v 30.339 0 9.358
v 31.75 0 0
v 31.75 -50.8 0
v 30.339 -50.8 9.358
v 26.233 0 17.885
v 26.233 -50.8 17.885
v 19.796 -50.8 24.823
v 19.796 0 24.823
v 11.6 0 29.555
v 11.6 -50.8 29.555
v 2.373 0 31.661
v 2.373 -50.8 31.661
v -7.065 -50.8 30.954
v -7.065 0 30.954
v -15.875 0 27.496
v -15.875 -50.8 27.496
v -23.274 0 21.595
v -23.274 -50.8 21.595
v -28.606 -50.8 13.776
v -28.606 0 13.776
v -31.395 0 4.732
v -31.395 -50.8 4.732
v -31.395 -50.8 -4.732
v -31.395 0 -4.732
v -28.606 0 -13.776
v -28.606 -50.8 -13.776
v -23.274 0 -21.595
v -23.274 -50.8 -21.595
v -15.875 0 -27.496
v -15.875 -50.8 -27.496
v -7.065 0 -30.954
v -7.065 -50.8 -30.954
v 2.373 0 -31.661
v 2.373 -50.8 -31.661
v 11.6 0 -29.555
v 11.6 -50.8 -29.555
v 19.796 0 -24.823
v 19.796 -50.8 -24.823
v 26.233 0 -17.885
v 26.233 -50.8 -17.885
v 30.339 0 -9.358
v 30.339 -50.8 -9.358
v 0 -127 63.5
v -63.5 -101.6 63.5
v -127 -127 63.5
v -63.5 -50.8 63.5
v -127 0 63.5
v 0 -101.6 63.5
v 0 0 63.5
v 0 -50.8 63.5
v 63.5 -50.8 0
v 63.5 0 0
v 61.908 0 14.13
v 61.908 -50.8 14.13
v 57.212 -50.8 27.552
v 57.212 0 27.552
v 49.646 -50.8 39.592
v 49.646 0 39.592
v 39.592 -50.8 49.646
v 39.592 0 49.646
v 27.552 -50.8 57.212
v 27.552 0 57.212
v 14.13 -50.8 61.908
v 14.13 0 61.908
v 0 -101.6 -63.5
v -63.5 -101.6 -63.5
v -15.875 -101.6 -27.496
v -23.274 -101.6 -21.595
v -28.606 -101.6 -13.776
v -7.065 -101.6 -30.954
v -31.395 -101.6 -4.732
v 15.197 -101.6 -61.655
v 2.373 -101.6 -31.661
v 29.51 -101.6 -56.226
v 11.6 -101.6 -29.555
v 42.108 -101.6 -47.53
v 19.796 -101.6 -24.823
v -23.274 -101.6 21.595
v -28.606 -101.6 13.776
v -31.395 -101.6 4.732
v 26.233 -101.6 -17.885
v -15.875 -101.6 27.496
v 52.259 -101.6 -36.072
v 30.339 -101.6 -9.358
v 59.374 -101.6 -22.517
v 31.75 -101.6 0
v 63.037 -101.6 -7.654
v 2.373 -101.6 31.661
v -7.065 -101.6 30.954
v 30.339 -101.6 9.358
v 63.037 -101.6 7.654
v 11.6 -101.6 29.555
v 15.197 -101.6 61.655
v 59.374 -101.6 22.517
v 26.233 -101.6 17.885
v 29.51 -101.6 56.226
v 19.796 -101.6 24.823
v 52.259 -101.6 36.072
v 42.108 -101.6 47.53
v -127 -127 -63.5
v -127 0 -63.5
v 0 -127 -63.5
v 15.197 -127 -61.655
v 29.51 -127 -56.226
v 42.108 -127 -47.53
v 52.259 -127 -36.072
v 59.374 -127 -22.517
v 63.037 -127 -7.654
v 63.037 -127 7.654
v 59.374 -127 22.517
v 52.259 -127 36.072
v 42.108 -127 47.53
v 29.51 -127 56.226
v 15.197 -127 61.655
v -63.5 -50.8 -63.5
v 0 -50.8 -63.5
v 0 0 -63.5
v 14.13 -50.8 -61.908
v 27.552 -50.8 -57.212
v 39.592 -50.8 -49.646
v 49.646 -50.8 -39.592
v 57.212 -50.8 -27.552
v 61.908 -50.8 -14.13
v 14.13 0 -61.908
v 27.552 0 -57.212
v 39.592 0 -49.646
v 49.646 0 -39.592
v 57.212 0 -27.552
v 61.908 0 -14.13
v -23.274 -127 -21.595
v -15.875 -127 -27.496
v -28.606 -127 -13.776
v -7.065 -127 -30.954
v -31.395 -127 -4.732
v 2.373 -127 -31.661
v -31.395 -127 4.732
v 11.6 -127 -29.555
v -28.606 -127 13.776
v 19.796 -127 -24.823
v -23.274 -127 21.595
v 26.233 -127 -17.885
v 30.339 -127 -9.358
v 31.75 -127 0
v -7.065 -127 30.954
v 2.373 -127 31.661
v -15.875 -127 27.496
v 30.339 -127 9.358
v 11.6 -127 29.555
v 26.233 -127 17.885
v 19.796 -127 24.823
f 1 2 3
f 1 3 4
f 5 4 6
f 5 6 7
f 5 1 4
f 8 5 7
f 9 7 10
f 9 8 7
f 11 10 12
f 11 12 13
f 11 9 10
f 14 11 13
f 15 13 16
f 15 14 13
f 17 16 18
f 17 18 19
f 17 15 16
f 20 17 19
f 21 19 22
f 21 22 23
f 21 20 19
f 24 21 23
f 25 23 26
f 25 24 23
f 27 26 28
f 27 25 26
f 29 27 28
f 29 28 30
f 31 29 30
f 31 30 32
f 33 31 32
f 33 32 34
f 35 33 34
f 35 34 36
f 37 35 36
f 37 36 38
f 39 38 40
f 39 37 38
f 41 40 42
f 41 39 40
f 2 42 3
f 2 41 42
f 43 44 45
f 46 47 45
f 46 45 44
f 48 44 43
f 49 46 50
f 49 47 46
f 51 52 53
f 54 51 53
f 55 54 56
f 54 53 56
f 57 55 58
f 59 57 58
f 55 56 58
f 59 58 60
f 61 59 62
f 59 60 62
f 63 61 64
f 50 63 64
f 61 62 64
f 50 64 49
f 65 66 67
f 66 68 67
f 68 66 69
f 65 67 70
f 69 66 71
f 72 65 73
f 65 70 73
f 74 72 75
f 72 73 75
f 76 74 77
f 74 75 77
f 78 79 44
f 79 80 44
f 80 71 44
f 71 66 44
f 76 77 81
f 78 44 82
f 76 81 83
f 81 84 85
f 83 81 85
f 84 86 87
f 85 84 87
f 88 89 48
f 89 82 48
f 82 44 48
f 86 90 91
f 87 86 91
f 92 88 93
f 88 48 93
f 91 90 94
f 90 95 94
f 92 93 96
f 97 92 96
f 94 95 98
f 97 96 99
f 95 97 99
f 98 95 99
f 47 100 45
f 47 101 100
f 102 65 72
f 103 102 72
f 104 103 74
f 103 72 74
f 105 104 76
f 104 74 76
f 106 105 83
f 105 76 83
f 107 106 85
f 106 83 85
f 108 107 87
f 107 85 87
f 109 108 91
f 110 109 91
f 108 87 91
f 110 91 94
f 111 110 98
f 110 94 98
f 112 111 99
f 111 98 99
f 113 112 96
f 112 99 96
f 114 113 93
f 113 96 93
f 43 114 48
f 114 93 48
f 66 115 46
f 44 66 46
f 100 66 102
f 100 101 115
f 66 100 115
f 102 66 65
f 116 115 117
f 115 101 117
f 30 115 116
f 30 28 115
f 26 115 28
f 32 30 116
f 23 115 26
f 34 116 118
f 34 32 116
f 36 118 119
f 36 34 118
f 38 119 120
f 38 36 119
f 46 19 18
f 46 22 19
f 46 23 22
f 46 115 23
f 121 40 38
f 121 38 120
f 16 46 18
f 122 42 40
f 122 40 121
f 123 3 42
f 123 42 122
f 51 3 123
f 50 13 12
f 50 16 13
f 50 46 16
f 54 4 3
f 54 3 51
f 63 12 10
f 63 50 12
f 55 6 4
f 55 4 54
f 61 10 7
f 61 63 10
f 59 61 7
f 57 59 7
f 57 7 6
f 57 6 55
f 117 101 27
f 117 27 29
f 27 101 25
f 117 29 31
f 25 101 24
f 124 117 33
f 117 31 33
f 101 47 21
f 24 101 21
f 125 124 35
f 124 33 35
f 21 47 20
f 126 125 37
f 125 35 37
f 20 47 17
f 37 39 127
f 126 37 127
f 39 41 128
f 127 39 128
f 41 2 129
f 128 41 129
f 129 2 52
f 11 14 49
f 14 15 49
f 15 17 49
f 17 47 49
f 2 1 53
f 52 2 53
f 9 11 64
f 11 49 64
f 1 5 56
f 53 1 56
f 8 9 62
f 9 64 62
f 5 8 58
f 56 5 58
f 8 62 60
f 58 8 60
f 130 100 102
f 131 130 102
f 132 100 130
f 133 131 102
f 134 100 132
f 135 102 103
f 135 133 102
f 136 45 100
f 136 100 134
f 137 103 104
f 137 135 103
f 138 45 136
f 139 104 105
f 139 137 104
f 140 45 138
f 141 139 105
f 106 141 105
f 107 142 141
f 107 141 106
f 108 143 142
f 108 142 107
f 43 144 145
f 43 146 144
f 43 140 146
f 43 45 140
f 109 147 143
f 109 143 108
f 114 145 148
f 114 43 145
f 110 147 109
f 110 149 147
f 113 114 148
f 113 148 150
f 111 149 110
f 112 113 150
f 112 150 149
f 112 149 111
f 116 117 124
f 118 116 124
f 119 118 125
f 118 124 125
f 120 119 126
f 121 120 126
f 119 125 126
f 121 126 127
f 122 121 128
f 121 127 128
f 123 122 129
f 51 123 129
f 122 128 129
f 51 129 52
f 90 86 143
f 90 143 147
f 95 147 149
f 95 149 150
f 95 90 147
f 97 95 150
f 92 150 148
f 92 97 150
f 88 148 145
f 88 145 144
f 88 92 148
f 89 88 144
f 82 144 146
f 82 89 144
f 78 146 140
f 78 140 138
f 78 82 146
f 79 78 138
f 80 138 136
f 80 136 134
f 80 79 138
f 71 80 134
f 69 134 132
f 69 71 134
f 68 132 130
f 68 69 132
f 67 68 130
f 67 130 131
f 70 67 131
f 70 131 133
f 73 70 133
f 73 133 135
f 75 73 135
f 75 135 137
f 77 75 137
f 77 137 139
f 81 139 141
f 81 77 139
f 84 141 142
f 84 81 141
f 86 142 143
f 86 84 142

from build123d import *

# Parameters (mm, degrees)
F0_R     = 31.75
F1_DEPTH = 50.8
F3_R     = 31.75
F4_DEPTH = 25.4
F5_W     = 63.5
F5_H     = 127
F6_DEPTH = 50.8
F7_W     = 63.5
F7_H     = 127
F8_DEPTH = 50.8


with BuildPart() as f1:
    # F0 (on Front) → F1 (new body)
    with BuildSketch(Plane.XZ):
        with BuildLine():
            ThreePointArc((0, -63.5), (44.9012806053, -44.9012806053), (63.5, 0))
            ThreePointArc((63.5, 0), (44.9012806053, 44.9012806053), (0, 63.5))
            ThreePointArc((0, 63.5), (-63.5, 0), (0, -63.5))
        make_face()
        Circle(F0_R, mode=Mode.SUBTRACT)
        with BuildLine():
            ThreePointArc((0, -63.5), (-63.5, 0), (0, 63.5))
            Line((0, 63.5), (-127, 63.5))
            Line((-127, 63.5), (-127, -63.5))
            Line((-127, -63.5), (0, -63.5))
        make_face()
    extrude(amount=F1_DEPTH)



with BuildPart() as f4:
    # F3 (on offset) → F4 (new body)
    with BuildSketch(Plane.XZ.offset(101.6)):
        with BuildLine():
            Line((-127, 63.5), (-127, -63.5))
            Line((-127, -63.5), (0, -63.5))
            ThreePointArc((0, -63.5), (63.5, 0), (0, 63.5))
            Line((0, 63.5), (-127, 63.5))
        make_face()
        Circle(F3_R, mode=Mode.SUBTRACT)
    extrude(amount=F4_DEPTH)


with BuildPart() as f6:
    # F5 (on face) → F6 (new body, through all)
    with BuildSketch(Plane.XZ.offset(50.8)):
        with Locations((-95.25, 0)):
            Rectangle(F5_W, F5_H)
    extrude(amount=F6_DEPTH)


with BuildPart() as f1_1:
    add(f1.part)

    add(f4.part)  # F8 merges F4

    add(f6.part)  # F8 merges F6
    # F7 (on face) → F8 (join, through all)
    with BuildSketch(Plane.XZ.offset(50.8)):
        with Locations((-95.25, 0)):
            Rectangle(F7_W, F7_H)
    extrude(amount=F8_DEPTH)


solid = f1_1.part
